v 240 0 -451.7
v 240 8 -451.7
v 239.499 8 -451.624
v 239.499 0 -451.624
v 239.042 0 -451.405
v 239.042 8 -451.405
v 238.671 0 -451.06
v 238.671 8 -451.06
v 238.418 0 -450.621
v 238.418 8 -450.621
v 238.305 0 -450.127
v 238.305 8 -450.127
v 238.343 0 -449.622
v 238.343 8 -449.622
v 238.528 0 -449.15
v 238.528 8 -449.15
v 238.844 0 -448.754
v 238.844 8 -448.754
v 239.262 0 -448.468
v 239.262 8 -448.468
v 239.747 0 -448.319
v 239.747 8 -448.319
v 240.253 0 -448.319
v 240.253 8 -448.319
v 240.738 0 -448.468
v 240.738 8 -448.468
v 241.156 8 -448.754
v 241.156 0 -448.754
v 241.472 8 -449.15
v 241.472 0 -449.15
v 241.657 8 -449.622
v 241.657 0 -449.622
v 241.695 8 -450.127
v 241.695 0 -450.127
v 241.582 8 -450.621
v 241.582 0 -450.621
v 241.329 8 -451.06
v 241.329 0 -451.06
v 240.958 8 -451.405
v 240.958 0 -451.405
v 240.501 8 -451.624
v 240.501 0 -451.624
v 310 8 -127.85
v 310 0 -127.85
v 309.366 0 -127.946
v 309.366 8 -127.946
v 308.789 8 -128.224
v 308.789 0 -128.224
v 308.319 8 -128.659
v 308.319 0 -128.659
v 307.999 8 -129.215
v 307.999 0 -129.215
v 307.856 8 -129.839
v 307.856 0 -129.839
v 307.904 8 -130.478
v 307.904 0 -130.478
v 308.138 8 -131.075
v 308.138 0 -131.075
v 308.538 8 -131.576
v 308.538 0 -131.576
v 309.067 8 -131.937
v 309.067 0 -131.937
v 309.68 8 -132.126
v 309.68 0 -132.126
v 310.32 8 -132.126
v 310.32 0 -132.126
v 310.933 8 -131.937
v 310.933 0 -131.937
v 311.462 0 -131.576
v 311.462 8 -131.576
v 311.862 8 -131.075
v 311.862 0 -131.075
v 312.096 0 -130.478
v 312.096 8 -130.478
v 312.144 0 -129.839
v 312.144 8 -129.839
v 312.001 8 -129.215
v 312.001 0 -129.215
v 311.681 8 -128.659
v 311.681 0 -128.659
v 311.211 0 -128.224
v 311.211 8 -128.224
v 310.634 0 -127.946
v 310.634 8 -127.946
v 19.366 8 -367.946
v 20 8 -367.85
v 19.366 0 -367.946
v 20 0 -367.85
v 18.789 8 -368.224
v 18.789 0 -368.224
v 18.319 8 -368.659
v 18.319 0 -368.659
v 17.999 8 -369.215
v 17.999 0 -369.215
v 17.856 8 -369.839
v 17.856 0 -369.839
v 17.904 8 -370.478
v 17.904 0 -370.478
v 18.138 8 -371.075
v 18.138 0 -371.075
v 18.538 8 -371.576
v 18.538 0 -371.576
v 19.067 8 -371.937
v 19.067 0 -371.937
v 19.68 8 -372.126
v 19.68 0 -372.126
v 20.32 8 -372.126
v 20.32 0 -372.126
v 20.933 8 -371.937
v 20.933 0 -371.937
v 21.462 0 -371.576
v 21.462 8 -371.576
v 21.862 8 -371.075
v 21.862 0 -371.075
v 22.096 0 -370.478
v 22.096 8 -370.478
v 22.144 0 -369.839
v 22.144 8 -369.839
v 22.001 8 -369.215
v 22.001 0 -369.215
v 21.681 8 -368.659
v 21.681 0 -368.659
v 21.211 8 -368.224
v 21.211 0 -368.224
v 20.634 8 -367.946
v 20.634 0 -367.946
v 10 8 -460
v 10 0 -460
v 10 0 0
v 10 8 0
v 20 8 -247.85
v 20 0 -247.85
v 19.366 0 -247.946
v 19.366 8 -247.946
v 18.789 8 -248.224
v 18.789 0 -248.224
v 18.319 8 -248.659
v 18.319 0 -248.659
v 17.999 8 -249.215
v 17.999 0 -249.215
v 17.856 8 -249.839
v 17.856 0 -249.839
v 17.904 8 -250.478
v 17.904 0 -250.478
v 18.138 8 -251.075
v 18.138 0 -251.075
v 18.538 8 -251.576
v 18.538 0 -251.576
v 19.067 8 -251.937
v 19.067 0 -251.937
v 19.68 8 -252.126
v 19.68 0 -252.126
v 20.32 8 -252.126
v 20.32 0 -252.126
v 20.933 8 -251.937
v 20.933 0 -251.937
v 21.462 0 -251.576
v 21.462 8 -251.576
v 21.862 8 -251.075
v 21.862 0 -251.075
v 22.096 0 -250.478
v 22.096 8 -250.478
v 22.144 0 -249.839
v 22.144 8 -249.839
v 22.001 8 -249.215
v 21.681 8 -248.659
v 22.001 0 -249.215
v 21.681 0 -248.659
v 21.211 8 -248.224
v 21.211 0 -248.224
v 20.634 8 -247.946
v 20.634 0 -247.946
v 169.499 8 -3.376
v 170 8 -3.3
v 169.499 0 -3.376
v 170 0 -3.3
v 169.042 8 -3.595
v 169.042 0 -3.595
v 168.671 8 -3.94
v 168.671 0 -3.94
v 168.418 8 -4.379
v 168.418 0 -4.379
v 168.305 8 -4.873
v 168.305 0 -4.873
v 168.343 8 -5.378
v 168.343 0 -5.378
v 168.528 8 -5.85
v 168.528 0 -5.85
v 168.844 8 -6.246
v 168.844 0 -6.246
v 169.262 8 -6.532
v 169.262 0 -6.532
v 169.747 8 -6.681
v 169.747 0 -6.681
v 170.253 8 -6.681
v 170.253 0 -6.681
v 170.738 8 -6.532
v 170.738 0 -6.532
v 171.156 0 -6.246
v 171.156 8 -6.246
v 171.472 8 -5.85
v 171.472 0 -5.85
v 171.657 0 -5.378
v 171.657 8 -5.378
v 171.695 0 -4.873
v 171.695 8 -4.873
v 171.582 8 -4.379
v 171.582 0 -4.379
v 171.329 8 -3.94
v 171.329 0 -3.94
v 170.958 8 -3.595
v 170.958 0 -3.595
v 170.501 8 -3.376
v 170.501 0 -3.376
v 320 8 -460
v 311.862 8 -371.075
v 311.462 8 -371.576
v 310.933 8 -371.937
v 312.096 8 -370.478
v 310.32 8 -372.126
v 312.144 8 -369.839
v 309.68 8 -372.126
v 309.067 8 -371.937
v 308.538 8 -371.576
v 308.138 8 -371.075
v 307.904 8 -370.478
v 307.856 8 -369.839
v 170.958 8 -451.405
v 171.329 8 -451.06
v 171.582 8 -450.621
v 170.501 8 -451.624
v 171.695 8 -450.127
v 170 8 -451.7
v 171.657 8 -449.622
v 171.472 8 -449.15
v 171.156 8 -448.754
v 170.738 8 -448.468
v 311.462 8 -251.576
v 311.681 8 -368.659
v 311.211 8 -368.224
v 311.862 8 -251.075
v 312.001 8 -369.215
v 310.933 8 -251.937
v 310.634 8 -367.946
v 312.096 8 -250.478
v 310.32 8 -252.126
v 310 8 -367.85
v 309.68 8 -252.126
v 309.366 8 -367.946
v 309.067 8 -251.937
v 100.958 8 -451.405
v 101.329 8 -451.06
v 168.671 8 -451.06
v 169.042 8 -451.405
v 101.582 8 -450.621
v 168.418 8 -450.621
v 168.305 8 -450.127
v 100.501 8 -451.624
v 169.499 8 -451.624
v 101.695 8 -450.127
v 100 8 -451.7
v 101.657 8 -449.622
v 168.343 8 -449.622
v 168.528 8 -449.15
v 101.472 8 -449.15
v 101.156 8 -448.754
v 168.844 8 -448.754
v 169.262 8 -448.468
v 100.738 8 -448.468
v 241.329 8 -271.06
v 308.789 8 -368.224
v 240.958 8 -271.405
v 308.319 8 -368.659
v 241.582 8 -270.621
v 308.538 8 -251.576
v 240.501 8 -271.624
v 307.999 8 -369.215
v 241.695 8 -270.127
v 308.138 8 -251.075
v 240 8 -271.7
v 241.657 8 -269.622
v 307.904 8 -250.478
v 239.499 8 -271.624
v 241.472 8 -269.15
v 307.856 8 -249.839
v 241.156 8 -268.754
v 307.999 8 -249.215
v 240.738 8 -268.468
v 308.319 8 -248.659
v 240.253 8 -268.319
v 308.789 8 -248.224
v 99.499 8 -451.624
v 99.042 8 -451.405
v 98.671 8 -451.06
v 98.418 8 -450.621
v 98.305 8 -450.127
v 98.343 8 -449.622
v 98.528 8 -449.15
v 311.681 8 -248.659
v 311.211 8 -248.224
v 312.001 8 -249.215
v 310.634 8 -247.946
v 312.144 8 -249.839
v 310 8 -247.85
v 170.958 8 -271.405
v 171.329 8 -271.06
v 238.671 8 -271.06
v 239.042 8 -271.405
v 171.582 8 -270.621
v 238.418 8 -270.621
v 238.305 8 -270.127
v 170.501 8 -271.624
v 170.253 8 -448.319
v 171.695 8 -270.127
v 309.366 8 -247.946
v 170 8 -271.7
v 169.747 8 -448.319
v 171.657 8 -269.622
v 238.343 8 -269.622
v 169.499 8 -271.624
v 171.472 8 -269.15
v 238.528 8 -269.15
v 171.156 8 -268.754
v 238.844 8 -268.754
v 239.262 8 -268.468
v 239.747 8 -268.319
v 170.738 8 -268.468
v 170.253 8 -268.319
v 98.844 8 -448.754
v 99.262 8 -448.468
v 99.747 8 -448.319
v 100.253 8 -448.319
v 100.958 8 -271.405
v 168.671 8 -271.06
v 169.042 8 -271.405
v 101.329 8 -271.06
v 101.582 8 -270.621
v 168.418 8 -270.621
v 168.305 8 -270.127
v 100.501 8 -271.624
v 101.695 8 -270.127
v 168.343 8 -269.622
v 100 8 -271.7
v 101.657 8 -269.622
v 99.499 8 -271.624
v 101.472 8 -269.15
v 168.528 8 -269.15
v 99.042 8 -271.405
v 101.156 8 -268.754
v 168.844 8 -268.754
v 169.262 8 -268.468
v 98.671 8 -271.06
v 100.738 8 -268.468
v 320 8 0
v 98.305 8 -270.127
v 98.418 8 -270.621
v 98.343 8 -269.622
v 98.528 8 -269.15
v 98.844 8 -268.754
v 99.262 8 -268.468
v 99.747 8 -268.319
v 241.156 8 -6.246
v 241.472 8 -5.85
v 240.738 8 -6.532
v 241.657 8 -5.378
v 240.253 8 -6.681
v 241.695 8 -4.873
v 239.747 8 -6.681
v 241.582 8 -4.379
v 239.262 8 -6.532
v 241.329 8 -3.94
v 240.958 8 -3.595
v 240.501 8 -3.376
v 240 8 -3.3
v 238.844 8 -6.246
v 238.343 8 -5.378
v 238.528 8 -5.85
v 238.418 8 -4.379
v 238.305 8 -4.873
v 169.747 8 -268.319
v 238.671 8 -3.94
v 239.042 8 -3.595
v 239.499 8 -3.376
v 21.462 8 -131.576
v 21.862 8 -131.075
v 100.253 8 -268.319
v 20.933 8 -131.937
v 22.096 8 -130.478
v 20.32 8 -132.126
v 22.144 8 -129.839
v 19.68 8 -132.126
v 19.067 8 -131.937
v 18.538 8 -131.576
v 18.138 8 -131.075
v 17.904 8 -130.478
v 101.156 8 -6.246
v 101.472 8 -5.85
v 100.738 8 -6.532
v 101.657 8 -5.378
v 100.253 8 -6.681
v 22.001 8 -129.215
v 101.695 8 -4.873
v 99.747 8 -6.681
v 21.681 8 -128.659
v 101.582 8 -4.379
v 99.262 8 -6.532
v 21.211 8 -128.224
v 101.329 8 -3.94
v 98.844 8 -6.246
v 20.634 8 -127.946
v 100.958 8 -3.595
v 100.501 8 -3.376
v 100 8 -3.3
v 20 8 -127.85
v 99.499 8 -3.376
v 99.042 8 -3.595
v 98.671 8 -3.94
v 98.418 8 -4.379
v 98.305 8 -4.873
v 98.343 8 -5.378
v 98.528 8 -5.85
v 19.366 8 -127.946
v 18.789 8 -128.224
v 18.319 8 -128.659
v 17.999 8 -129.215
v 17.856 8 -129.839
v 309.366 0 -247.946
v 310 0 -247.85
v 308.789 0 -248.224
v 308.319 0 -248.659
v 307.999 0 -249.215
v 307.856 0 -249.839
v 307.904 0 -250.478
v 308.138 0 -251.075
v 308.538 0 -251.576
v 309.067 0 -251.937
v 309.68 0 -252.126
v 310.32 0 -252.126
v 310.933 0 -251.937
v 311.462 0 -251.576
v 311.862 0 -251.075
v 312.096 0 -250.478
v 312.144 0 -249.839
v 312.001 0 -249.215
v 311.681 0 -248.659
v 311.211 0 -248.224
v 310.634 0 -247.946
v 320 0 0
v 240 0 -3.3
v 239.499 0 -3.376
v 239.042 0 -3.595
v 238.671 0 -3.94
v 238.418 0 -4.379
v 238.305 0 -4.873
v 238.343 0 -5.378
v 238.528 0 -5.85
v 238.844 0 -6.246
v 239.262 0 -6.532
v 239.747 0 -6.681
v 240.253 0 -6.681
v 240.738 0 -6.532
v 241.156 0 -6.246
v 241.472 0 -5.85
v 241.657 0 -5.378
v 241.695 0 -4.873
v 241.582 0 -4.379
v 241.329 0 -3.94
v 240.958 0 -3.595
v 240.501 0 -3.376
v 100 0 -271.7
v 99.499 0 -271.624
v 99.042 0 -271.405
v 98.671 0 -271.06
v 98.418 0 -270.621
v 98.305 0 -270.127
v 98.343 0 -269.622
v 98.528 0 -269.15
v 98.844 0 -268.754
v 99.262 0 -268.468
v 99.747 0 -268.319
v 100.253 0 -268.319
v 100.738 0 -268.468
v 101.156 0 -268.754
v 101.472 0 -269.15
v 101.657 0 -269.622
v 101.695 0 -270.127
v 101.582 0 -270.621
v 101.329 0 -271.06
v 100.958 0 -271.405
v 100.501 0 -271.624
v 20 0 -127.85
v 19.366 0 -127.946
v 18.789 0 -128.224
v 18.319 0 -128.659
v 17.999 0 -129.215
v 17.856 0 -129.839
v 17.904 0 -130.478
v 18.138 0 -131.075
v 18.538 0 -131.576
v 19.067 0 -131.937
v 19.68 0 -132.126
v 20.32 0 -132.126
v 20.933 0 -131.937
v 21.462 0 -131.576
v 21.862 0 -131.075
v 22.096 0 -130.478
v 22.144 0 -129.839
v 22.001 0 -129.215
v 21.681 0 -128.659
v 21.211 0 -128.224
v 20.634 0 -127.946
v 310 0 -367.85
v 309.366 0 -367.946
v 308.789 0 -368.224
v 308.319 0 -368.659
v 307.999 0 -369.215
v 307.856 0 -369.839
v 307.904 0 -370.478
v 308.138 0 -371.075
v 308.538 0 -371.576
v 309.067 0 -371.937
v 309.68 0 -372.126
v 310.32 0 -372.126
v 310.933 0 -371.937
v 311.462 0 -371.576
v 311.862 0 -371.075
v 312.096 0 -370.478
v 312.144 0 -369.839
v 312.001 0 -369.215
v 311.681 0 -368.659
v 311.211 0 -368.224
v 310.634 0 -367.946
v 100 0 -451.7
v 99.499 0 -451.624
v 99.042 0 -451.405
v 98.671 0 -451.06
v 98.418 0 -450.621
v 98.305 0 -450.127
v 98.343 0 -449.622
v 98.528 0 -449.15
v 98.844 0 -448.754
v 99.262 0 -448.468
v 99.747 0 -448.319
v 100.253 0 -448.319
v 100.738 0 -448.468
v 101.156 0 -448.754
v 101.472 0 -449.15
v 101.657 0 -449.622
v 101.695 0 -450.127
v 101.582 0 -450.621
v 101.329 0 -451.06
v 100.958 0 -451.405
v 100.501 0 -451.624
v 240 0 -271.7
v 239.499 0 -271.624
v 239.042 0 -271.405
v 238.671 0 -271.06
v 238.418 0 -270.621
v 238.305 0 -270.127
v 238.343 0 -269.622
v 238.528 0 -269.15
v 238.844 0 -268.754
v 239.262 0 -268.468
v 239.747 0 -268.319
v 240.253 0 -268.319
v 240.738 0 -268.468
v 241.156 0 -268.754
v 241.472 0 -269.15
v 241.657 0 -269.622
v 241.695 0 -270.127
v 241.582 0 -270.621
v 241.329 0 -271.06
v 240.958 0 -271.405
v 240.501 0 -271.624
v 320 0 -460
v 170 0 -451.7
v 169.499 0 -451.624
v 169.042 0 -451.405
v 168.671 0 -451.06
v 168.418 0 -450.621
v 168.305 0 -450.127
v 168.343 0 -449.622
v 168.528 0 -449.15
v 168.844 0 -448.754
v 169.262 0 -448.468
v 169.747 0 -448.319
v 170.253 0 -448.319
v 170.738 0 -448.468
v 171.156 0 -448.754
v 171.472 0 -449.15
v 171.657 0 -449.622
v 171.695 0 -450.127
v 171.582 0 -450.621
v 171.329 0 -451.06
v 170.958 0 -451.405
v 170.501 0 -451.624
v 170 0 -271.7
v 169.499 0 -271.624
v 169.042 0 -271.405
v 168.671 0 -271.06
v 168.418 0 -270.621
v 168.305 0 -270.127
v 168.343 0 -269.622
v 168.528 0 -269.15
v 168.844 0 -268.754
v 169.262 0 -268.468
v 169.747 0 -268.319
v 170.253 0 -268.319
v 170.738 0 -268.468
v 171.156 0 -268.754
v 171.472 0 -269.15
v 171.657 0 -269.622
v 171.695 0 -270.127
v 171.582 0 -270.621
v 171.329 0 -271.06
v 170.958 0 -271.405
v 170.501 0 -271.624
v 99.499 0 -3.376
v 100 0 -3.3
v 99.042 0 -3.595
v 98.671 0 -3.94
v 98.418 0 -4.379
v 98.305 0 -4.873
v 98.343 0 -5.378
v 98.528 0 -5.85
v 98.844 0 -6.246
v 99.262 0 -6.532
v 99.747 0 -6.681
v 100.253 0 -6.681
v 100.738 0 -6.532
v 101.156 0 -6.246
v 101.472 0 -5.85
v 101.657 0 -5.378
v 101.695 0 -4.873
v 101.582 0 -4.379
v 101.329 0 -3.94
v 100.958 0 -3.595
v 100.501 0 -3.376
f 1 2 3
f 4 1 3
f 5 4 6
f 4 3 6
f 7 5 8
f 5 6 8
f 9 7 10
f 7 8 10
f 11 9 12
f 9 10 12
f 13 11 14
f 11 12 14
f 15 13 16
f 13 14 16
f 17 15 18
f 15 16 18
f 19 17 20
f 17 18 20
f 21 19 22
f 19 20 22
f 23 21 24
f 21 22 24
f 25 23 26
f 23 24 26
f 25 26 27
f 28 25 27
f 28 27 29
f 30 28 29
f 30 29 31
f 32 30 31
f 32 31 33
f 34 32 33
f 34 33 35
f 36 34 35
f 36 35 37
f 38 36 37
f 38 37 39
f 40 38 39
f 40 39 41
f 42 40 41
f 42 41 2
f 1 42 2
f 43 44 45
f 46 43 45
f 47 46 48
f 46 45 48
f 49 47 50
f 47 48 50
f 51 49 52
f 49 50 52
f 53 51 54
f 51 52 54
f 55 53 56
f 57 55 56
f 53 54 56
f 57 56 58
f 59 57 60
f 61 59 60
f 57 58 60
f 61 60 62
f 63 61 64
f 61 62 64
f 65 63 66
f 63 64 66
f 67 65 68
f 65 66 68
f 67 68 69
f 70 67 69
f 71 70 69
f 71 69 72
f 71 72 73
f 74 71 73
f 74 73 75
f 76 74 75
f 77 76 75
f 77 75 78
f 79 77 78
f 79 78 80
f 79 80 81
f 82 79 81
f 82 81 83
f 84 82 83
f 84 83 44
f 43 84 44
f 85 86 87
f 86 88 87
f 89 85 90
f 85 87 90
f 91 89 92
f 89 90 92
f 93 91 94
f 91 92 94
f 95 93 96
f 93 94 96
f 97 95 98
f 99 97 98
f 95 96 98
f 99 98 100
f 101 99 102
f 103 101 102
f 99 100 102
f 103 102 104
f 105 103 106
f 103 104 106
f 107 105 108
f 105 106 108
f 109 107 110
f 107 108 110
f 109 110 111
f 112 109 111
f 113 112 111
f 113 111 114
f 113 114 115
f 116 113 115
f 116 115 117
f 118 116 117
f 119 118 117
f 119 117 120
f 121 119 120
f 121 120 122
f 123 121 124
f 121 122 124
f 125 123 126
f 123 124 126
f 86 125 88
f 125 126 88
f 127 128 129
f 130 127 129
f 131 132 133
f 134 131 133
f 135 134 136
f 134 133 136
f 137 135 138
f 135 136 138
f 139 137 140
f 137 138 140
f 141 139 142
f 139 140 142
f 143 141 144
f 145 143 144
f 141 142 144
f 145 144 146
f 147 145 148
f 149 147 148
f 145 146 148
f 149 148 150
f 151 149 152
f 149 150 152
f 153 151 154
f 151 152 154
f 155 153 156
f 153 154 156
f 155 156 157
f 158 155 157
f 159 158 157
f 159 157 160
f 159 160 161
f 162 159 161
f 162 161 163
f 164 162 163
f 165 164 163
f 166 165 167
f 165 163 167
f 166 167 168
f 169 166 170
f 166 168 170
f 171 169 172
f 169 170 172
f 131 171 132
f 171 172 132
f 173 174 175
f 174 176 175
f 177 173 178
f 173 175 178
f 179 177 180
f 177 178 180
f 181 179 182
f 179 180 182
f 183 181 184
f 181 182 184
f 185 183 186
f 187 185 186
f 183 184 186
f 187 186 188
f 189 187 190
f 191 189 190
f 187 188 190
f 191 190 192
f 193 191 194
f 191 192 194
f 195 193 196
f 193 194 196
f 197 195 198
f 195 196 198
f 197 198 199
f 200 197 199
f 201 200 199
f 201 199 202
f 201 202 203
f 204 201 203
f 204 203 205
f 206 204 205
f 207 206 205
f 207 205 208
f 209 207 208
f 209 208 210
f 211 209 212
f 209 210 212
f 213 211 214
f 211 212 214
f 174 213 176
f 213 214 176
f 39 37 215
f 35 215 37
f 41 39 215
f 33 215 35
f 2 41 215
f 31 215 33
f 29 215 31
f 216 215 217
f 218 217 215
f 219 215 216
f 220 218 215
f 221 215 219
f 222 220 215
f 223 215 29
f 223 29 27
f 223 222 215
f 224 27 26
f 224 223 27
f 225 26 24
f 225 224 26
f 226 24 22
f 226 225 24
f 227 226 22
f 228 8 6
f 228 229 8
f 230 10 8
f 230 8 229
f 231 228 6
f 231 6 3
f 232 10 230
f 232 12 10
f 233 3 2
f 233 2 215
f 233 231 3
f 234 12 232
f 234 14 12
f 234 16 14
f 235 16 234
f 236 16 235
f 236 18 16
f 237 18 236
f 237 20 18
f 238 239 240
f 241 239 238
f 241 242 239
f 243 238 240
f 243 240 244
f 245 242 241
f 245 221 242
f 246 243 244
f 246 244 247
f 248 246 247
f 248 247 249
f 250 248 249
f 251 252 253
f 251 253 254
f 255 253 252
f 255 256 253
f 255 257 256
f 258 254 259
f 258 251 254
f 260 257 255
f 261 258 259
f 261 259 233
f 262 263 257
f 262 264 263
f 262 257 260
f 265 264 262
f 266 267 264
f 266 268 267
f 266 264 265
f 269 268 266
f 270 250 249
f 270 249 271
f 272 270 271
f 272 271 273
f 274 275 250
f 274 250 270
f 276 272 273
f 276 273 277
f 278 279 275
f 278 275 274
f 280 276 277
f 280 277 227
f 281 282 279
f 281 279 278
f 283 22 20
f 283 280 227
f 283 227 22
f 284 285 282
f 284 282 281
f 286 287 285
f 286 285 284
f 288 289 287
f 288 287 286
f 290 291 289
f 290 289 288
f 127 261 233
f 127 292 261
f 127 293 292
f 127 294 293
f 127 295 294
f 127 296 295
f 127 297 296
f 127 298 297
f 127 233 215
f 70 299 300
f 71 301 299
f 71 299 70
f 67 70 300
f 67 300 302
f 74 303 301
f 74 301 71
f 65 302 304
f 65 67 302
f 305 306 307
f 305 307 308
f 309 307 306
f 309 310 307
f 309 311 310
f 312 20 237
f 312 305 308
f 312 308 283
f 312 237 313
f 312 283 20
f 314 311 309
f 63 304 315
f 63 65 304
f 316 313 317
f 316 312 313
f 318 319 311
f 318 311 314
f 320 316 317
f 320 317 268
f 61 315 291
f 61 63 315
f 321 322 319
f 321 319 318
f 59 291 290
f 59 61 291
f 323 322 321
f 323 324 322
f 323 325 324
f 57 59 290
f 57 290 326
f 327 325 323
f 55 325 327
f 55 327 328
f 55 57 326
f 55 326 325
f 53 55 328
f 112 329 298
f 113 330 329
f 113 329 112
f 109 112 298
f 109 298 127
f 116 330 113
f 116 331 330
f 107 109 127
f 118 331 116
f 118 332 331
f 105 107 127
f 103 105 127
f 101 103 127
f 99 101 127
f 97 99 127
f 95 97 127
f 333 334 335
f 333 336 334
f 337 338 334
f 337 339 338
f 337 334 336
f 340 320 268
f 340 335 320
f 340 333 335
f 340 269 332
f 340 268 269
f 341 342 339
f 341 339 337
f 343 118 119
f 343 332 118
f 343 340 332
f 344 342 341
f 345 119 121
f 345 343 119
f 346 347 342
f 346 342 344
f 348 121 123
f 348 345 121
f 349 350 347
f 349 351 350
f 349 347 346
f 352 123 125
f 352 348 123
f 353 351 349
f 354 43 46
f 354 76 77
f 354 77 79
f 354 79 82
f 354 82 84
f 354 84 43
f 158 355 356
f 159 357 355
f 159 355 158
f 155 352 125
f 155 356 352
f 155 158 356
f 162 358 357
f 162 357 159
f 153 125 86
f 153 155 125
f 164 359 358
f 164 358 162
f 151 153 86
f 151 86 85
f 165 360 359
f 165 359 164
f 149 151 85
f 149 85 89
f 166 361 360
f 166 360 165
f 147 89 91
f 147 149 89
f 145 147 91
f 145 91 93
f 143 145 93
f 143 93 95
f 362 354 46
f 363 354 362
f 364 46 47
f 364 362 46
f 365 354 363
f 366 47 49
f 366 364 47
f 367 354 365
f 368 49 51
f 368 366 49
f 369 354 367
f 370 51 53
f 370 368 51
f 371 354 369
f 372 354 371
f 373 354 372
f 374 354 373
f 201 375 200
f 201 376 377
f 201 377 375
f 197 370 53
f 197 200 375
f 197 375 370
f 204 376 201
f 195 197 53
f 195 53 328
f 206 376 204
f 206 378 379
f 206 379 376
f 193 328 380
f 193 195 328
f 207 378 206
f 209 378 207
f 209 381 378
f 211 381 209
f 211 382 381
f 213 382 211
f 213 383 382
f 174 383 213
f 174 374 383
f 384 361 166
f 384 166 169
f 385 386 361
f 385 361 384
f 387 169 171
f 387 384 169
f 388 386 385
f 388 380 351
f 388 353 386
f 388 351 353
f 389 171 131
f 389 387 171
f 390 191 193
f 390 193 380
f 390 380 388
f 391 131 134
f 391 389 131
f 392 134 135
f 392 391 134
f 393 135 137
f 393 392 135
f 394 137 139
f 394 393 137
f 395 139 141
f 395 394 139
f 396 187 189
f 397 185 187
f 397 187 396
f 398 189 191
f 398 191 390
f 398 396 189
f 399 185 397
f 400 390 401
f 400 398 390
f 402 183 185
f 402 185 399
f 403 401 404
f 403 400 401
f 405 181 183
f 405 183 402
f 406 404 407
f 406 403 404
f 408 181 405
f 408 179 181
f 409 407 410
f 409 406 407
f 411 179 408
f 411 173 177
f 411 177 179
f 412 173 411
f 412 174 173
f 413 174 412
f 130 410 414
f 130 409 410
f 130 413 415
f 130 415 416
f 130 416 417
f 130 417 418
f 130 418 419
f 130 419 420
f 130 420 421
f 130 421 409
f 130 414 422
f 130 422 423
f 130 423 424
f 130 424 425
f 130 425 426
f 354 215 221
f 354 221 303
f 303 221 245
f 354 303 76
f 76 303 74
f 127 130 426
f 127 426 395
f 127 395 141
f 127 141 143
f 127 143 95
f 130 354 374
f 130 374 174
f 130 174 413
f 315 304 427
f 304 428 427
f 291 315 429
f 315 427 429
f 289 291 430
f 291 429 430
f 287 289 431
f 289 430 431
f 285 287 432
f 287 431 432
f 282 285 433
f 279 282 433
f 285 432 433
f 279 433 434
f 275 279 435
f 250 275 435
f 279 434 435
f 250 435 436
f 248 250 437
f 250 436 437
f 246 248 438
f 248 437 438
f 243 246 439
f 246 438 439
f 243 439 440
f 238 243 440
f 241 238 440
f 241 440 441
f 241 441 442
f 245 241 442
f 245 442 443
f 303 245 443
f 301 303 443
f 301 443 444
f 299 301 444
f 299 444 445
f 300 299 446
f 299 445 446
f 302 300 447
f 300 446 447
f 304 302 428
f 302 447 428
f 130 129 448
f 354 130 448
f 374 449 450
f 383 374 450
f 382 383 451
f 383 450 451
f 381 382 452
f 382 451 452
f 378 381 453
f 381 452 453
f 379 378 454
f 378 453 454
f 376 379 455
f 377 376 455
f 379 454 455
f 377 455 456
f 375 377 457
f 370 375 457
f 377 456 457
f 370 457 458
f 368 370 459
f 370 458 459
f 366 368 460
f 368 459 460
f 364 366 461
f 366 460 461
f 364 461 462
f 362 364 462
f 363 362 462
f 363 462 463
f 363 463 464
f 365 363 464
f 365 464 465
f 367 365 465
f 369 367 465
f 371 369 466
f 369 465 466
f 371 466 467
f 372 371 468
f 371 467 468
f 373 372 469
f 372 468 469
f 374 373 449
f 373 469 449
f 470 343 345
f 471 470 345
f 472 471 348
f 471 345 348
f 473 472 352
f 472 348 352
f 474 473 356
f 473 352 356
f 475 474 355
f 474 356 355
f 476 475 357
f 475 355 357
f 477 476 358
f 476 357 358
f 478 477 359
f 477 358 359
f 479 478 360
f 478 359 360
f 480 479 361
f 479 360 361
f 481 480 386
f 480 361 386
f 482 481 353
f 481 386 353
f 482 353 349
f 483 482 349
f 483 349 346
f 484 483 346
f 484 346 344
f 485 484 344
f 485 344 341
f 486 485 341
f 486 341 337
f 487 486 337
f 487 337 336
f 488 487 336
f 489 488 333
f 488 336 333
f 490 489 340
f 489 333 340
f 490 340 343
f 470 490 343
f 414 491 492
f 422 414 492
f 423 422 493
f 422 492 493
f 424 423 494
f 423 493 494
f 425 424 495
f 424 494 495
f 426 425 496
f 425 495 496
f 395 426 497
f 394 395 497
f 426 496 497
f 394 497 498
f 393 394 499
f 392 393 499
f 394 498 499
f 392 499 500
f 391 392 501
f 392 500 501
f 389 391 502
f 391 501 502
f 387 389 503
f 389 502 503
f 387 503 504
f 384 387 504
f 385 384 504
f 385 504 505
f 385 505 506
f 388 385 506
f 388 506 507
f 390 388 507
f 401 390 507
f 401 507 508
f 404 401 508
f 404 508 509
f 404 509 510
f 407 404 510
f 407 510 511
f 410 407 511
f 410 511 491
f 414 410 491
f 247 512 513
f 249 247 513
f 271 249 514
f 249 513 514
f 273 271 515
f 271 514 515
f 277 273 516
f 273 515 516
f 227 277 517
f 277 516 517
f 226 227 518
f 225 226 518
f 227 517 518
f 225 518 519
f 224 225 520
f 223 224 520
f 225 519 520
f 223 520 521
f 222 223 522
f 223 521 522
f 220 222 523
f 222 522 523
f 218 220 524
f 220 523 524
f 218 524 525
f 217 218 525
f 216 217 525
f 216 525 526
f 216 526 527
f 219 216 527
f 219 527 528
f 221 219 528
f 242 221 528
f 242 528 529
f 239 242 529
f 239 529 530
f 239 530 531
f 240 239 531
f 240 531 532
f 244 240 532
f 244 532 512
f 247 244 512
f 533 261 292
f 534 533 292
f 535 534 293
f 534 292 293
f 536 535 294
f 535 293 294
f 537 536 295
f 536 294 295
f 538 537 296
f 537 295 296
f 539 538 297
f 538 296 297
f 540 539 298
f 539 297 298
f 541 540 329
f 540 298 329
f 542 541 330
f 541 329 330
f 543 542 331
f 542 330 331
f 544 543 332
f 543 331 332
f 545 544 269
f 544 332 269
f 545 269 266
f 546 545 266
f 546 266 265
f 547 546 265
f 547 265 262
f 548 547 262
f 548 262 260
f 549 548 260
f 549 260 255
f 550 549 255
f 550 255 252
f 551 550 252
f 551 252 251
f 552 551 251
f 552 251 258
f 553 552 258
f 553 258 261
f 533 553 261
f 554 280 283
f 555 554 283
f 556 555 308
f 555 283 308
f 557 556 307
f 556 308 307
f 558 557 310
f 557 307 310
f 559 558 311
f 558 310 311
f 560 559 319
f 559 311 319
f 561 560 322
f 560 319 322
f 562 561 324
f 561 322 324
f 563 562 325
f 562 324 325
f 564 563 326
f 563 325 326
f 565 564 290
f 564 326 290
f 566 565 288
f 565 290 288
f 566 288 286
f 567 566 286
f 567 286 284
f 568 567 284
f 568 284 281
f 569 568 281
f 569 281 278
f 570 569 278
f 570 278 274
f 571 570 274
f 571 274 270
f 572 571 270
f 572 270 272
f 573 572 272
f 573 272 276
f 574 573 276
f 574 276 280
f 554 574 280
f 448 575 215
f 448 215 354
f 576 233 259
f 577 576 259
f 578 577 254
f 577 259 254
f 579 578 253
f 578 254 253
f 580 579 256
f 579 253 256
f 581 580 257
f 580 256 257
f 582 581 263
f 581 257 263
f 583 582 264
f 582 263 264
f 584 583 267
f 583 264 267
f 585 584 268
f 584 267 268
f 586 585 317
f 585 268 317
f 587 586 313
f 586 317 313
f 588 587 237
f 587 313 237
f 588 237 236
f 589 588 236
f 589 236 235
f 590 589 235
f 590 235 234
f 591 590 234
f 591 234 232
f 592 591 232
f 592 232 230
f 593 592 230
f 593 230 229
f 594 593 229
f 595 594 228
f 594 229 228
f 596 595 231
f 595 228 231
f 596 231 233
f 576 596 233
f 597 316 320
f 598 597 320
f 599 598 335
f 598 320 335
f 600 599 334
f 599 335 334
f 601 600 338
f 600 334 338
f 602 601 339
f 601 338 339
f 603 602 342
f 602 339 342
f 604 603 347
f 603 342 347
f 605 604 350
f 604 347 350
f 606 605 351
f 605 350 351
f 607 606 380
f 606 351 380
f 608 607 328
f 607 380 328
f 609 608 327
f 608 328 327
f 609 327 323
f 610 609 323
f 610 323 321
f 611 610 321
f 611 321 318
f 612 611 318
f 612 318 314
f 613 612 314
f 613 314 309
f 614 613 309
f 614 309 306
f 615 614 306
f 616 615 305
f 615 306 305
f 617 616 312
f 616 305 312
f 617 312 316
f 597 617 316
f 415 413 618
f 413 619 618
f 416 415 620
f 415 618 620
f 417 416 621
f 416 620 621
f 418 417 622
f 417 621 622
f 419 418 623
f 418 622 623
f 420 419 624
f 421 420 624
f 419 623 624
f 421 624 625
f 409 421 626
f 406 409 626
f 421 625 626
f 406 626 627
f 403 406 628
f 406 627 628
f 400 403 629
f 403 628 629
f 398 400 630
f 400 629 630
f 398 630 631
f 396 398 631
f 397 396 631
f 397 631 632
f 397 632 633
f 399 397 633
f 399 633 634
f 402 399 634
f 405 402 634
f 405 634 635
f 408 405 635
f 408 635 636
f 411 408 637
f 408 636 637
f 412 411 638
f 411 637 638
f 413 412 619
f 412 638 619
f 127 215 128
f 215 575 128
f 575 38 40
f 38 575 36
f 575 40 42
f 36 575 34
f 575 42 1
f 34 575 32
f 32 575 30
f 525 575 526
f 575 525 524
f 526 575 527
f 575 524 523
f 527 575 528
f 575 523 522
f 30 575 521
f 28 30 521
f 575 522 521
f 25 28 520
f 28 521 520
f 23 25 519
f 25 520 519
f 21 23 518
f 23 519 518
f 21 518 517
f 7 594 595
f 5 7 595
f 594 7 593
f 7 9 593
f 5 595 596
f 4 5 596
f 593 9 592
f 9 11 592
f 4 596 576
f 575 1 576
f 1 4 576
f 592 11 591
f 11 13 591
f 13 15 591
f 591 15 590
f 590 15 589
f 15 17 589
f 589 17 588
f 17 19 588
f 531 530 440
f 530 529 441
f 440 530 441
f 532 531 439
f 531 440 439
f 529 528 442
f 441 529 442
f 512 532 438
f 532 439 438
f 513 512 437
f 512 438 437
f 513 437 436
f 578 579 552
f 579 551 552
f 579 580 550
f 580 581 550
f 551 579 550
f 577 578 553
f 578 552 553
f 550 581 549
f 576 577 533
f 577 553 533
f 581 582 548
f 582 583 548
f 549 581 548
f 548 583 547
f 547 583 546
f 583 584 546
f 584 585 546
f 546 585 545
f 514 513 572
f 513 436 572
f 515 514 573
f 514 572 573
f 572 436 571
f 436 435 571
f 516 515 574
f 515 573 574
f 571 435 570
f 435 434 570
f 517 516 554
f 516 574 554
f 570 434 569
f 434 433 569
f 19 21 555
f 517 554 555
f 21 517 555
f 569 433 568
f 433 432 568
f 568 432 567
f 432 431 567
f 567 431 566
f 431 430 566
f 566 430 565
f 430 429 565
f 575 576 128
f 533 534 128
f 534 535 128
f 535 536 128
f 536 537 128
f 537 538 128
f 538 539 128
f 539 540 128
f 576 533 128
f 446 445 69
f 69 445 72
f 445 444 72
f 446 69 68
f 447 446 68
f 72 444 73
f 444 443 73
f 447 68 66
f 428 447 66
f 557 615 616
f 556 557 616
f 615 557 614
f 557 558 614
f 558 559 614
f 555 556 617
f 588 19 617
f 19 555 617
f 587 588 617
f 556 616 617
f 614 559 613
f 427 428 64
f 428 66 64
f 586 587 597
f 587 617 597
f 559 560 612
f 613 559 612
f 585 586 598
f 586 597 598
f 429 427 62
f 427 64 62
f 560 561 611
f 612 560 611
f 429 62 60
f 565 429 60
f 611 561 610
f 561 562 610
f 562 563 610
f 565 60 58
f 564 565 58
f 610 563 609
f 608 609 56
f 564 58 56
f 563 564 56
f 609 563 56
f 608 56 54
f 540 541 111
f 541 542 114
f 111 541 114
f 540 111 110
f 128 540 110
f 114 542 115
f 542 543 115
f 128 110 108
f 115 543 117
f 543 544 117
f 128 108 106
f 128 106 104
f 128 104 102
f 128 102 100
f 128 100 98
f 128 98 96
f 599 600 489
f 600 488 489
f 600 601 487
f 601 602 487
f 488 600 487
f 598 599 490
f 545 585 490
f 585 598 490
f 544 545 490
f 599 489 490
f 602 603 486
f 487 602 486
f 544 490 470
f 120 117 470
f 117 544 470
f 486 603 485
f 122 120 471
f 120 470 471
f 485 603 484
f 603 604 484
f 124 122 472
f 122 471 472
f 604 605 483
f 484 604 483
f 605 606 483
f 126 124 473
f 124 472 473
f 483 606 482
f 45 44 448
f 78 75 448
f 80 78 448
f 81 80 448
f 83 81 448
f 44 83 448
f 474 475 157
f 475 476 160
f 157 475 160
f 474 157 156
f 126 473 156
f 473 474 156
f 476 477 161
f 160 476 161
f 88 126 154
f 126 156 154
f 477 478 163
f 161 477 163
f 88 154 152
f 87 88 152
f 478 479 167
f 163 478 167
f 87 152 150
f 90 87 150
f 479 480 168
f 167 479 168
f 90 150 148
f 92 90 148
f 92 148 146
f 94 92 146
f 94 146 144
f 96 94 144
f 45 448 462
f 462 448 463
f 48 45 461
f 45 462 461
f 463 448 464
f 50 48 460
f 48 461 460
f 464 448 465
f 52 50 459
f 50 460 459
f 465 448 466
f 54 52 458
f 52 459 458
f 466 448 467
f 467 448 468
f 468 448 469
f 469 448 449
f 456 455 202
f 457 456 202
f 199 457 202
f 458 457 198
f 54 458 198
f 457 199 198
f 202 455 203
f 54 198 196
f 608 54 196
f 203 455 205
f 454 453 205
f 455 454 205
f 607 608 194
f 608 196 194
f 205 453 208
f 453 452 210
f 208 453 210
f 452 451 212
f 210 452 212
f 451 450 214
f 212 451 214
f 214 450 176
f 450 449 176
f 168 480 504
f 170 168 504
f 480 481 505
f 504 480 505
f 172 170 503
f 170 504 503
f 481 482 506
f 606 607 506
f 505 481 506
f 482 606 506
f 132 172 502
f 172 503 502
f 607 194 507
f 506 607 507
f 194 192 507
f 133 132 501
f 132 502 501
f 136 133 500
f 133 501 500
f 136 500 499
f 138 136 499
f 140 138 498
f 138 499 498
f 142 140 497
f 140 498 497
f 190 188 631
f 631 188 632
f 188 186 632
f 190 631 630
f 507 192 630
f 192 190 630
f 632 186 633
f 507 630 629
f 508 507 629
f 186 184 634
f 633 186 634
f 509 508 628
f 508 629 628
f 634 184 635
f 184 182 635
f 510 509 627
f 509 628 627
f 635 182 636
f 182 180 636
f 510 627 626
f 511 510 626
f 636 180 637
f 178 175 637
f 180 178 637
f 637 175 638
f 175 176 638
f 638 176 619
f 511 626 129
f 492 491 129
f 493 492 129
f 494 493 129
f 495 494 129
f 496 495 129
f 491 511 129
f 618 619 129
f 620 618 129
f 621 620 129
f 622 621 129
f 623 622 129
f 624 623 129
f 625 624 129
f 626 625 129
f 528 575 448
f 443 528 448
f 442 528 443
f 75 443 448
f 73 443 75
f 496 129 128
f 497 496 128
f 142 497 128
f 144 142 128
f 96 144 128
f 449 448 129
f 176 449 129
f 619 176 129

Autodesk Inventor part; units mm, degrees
ref_plane "YZ Plane" through (0, 0, 0) normal (1, 0, 0) x (0, 1, 0)
ref_plane "XZ Plane" through (0, 0, 0) normal (0, 1, 0) x (-1, 0, 0)
ref_plane "XY Plane" through (0, 0, 0) normal (0, 0, 1) x (1, 0, 0)
sketch "Sketch1" plane through (0, 0, 0) normal (0, 1, 0) x (-1, 0, 0)
  line L0 (-10, 0) -> (-310, 0)
  line L1 (-310, 0) -> (-310, -500)
  line L2 (-310, -500) -> (-10, -500)
  line L3 (-10, -500) -> (-10, 0)
  line L4 (-310, -500) -> (-320, -500)
  line L5 (-320, -500) -> (-320, 0)
  line L6 (-320, 0) -> (-310, 0)
  line L7 (-310, 0) -> (-310, -500)
  line L8 (-320, -460) -> (-10, -460)
  dimension "d101" = 300
  dimension "d102" = 500
  dimension "d110" = 10
extrude "Extrusion1" add sketch "Sketch1" along normal blind 8 contours L3 L8 L1 L0 | L1 L8 L5 L6
sketch "Sketch5" plane through (0, 8, 0) normal (0, 1, 0) x (1, 0, 0)
  line L0 (10, 0) -> (10, 130)
  line L1 (0, 0) -> (320, 0) projected
  line L2 (10, 0) -> (140, 0) construction
  line L3 (10, 130) -> (10, 250)
  line L4 (10, 250) -> (10, 370)
  line L5 (10, 370) -> (10, 500)
  point P0 (310, 370)
  point P1 (310, 250)
  point P2 (310, 130)
  point P3 (20, 370)
  point P4 (20, 250)
  point P5 (20, 130)
  dimension "d111" = 130
  dimension "d112" = 90
  dimension "d113" = 120
  dimension "d114" = 120
  dimension "d115" = 130
hole "Hole2" at (310, 8, -130) at (310, 8, -250) at (310, 8, -370) at (20, 8, -130) at (20, 8, -250) at (20, 8, -370) direction (0, -1, 0) diameter 4.3 end through all clearance for "Socket Head Cap Screw ISO 4762" size "M4" standard "ISO"
sketch "Sketch6" plane through (0, 8, 0) normal (0, 1, 0) x (1, 0, 0)
  line L0 (10, 460) -> (10, 0) projected
  line L1 (10, 5) -> (320, 5)
  line L2 (320, 0) -> (320, 460) projected
  line L3 (10, 5) -> (20, 5)
  line L4 (20, 5) -> (100, 5)
  line L5 (100, 5) -> (170, 5)
  line L6 (170, 5) -> (240, 5)
  line L7 (240, 5) -> (320, 5)
  point P0 (0, 0)
  point P1 (10, 500)
  point P2 (320, 500)
  dimension "d143" = 10
  dimension "d144" = 80
  dimension "d145" = 70
  dimension "d146" = 70
hole "Hole3" at (100, 8, -5) at (170, 8, -5) at (240, 8, -5) direction (0, -1, 0) diameter 3.4 end through all clearance for "Socket Head Cap Screw ISO 4762" size "M3" standard "ISO"
sketch "Sketch7" plane through (0, 0, 0) normal (0, -1, 0) x (1, 0, 0)
  line L0 (10, -260) -> (320, -260)
  line L1 (320, 0) -> (320, -460) projected
  line L2 (10, -260) -> (320, -260) construction
  point P0 (0, 0)
  point P1 (320, -500)
  point P2 (100, -270)
  point P3 (170, -270)
  point P4 (240, -270)
  point P5 (100, -450)
  point P6 (170, -450)
  point P7 (240, -450)
  dimension "d148" = 0
  dimension "d151" = 180
hole "Hole4" at (100, 0, -270) at (170, 0, -270) at (240, 0, -270) at (100, 0, -450) at (170, 0, -450) at (240, 0, -450) direction (0, 1, 0) diameter 3.4 end through all clearance for "Socket Head Cap Screw ISO 4762" size "M3" standard "ISO"
properties part number "TeflonPlate"
